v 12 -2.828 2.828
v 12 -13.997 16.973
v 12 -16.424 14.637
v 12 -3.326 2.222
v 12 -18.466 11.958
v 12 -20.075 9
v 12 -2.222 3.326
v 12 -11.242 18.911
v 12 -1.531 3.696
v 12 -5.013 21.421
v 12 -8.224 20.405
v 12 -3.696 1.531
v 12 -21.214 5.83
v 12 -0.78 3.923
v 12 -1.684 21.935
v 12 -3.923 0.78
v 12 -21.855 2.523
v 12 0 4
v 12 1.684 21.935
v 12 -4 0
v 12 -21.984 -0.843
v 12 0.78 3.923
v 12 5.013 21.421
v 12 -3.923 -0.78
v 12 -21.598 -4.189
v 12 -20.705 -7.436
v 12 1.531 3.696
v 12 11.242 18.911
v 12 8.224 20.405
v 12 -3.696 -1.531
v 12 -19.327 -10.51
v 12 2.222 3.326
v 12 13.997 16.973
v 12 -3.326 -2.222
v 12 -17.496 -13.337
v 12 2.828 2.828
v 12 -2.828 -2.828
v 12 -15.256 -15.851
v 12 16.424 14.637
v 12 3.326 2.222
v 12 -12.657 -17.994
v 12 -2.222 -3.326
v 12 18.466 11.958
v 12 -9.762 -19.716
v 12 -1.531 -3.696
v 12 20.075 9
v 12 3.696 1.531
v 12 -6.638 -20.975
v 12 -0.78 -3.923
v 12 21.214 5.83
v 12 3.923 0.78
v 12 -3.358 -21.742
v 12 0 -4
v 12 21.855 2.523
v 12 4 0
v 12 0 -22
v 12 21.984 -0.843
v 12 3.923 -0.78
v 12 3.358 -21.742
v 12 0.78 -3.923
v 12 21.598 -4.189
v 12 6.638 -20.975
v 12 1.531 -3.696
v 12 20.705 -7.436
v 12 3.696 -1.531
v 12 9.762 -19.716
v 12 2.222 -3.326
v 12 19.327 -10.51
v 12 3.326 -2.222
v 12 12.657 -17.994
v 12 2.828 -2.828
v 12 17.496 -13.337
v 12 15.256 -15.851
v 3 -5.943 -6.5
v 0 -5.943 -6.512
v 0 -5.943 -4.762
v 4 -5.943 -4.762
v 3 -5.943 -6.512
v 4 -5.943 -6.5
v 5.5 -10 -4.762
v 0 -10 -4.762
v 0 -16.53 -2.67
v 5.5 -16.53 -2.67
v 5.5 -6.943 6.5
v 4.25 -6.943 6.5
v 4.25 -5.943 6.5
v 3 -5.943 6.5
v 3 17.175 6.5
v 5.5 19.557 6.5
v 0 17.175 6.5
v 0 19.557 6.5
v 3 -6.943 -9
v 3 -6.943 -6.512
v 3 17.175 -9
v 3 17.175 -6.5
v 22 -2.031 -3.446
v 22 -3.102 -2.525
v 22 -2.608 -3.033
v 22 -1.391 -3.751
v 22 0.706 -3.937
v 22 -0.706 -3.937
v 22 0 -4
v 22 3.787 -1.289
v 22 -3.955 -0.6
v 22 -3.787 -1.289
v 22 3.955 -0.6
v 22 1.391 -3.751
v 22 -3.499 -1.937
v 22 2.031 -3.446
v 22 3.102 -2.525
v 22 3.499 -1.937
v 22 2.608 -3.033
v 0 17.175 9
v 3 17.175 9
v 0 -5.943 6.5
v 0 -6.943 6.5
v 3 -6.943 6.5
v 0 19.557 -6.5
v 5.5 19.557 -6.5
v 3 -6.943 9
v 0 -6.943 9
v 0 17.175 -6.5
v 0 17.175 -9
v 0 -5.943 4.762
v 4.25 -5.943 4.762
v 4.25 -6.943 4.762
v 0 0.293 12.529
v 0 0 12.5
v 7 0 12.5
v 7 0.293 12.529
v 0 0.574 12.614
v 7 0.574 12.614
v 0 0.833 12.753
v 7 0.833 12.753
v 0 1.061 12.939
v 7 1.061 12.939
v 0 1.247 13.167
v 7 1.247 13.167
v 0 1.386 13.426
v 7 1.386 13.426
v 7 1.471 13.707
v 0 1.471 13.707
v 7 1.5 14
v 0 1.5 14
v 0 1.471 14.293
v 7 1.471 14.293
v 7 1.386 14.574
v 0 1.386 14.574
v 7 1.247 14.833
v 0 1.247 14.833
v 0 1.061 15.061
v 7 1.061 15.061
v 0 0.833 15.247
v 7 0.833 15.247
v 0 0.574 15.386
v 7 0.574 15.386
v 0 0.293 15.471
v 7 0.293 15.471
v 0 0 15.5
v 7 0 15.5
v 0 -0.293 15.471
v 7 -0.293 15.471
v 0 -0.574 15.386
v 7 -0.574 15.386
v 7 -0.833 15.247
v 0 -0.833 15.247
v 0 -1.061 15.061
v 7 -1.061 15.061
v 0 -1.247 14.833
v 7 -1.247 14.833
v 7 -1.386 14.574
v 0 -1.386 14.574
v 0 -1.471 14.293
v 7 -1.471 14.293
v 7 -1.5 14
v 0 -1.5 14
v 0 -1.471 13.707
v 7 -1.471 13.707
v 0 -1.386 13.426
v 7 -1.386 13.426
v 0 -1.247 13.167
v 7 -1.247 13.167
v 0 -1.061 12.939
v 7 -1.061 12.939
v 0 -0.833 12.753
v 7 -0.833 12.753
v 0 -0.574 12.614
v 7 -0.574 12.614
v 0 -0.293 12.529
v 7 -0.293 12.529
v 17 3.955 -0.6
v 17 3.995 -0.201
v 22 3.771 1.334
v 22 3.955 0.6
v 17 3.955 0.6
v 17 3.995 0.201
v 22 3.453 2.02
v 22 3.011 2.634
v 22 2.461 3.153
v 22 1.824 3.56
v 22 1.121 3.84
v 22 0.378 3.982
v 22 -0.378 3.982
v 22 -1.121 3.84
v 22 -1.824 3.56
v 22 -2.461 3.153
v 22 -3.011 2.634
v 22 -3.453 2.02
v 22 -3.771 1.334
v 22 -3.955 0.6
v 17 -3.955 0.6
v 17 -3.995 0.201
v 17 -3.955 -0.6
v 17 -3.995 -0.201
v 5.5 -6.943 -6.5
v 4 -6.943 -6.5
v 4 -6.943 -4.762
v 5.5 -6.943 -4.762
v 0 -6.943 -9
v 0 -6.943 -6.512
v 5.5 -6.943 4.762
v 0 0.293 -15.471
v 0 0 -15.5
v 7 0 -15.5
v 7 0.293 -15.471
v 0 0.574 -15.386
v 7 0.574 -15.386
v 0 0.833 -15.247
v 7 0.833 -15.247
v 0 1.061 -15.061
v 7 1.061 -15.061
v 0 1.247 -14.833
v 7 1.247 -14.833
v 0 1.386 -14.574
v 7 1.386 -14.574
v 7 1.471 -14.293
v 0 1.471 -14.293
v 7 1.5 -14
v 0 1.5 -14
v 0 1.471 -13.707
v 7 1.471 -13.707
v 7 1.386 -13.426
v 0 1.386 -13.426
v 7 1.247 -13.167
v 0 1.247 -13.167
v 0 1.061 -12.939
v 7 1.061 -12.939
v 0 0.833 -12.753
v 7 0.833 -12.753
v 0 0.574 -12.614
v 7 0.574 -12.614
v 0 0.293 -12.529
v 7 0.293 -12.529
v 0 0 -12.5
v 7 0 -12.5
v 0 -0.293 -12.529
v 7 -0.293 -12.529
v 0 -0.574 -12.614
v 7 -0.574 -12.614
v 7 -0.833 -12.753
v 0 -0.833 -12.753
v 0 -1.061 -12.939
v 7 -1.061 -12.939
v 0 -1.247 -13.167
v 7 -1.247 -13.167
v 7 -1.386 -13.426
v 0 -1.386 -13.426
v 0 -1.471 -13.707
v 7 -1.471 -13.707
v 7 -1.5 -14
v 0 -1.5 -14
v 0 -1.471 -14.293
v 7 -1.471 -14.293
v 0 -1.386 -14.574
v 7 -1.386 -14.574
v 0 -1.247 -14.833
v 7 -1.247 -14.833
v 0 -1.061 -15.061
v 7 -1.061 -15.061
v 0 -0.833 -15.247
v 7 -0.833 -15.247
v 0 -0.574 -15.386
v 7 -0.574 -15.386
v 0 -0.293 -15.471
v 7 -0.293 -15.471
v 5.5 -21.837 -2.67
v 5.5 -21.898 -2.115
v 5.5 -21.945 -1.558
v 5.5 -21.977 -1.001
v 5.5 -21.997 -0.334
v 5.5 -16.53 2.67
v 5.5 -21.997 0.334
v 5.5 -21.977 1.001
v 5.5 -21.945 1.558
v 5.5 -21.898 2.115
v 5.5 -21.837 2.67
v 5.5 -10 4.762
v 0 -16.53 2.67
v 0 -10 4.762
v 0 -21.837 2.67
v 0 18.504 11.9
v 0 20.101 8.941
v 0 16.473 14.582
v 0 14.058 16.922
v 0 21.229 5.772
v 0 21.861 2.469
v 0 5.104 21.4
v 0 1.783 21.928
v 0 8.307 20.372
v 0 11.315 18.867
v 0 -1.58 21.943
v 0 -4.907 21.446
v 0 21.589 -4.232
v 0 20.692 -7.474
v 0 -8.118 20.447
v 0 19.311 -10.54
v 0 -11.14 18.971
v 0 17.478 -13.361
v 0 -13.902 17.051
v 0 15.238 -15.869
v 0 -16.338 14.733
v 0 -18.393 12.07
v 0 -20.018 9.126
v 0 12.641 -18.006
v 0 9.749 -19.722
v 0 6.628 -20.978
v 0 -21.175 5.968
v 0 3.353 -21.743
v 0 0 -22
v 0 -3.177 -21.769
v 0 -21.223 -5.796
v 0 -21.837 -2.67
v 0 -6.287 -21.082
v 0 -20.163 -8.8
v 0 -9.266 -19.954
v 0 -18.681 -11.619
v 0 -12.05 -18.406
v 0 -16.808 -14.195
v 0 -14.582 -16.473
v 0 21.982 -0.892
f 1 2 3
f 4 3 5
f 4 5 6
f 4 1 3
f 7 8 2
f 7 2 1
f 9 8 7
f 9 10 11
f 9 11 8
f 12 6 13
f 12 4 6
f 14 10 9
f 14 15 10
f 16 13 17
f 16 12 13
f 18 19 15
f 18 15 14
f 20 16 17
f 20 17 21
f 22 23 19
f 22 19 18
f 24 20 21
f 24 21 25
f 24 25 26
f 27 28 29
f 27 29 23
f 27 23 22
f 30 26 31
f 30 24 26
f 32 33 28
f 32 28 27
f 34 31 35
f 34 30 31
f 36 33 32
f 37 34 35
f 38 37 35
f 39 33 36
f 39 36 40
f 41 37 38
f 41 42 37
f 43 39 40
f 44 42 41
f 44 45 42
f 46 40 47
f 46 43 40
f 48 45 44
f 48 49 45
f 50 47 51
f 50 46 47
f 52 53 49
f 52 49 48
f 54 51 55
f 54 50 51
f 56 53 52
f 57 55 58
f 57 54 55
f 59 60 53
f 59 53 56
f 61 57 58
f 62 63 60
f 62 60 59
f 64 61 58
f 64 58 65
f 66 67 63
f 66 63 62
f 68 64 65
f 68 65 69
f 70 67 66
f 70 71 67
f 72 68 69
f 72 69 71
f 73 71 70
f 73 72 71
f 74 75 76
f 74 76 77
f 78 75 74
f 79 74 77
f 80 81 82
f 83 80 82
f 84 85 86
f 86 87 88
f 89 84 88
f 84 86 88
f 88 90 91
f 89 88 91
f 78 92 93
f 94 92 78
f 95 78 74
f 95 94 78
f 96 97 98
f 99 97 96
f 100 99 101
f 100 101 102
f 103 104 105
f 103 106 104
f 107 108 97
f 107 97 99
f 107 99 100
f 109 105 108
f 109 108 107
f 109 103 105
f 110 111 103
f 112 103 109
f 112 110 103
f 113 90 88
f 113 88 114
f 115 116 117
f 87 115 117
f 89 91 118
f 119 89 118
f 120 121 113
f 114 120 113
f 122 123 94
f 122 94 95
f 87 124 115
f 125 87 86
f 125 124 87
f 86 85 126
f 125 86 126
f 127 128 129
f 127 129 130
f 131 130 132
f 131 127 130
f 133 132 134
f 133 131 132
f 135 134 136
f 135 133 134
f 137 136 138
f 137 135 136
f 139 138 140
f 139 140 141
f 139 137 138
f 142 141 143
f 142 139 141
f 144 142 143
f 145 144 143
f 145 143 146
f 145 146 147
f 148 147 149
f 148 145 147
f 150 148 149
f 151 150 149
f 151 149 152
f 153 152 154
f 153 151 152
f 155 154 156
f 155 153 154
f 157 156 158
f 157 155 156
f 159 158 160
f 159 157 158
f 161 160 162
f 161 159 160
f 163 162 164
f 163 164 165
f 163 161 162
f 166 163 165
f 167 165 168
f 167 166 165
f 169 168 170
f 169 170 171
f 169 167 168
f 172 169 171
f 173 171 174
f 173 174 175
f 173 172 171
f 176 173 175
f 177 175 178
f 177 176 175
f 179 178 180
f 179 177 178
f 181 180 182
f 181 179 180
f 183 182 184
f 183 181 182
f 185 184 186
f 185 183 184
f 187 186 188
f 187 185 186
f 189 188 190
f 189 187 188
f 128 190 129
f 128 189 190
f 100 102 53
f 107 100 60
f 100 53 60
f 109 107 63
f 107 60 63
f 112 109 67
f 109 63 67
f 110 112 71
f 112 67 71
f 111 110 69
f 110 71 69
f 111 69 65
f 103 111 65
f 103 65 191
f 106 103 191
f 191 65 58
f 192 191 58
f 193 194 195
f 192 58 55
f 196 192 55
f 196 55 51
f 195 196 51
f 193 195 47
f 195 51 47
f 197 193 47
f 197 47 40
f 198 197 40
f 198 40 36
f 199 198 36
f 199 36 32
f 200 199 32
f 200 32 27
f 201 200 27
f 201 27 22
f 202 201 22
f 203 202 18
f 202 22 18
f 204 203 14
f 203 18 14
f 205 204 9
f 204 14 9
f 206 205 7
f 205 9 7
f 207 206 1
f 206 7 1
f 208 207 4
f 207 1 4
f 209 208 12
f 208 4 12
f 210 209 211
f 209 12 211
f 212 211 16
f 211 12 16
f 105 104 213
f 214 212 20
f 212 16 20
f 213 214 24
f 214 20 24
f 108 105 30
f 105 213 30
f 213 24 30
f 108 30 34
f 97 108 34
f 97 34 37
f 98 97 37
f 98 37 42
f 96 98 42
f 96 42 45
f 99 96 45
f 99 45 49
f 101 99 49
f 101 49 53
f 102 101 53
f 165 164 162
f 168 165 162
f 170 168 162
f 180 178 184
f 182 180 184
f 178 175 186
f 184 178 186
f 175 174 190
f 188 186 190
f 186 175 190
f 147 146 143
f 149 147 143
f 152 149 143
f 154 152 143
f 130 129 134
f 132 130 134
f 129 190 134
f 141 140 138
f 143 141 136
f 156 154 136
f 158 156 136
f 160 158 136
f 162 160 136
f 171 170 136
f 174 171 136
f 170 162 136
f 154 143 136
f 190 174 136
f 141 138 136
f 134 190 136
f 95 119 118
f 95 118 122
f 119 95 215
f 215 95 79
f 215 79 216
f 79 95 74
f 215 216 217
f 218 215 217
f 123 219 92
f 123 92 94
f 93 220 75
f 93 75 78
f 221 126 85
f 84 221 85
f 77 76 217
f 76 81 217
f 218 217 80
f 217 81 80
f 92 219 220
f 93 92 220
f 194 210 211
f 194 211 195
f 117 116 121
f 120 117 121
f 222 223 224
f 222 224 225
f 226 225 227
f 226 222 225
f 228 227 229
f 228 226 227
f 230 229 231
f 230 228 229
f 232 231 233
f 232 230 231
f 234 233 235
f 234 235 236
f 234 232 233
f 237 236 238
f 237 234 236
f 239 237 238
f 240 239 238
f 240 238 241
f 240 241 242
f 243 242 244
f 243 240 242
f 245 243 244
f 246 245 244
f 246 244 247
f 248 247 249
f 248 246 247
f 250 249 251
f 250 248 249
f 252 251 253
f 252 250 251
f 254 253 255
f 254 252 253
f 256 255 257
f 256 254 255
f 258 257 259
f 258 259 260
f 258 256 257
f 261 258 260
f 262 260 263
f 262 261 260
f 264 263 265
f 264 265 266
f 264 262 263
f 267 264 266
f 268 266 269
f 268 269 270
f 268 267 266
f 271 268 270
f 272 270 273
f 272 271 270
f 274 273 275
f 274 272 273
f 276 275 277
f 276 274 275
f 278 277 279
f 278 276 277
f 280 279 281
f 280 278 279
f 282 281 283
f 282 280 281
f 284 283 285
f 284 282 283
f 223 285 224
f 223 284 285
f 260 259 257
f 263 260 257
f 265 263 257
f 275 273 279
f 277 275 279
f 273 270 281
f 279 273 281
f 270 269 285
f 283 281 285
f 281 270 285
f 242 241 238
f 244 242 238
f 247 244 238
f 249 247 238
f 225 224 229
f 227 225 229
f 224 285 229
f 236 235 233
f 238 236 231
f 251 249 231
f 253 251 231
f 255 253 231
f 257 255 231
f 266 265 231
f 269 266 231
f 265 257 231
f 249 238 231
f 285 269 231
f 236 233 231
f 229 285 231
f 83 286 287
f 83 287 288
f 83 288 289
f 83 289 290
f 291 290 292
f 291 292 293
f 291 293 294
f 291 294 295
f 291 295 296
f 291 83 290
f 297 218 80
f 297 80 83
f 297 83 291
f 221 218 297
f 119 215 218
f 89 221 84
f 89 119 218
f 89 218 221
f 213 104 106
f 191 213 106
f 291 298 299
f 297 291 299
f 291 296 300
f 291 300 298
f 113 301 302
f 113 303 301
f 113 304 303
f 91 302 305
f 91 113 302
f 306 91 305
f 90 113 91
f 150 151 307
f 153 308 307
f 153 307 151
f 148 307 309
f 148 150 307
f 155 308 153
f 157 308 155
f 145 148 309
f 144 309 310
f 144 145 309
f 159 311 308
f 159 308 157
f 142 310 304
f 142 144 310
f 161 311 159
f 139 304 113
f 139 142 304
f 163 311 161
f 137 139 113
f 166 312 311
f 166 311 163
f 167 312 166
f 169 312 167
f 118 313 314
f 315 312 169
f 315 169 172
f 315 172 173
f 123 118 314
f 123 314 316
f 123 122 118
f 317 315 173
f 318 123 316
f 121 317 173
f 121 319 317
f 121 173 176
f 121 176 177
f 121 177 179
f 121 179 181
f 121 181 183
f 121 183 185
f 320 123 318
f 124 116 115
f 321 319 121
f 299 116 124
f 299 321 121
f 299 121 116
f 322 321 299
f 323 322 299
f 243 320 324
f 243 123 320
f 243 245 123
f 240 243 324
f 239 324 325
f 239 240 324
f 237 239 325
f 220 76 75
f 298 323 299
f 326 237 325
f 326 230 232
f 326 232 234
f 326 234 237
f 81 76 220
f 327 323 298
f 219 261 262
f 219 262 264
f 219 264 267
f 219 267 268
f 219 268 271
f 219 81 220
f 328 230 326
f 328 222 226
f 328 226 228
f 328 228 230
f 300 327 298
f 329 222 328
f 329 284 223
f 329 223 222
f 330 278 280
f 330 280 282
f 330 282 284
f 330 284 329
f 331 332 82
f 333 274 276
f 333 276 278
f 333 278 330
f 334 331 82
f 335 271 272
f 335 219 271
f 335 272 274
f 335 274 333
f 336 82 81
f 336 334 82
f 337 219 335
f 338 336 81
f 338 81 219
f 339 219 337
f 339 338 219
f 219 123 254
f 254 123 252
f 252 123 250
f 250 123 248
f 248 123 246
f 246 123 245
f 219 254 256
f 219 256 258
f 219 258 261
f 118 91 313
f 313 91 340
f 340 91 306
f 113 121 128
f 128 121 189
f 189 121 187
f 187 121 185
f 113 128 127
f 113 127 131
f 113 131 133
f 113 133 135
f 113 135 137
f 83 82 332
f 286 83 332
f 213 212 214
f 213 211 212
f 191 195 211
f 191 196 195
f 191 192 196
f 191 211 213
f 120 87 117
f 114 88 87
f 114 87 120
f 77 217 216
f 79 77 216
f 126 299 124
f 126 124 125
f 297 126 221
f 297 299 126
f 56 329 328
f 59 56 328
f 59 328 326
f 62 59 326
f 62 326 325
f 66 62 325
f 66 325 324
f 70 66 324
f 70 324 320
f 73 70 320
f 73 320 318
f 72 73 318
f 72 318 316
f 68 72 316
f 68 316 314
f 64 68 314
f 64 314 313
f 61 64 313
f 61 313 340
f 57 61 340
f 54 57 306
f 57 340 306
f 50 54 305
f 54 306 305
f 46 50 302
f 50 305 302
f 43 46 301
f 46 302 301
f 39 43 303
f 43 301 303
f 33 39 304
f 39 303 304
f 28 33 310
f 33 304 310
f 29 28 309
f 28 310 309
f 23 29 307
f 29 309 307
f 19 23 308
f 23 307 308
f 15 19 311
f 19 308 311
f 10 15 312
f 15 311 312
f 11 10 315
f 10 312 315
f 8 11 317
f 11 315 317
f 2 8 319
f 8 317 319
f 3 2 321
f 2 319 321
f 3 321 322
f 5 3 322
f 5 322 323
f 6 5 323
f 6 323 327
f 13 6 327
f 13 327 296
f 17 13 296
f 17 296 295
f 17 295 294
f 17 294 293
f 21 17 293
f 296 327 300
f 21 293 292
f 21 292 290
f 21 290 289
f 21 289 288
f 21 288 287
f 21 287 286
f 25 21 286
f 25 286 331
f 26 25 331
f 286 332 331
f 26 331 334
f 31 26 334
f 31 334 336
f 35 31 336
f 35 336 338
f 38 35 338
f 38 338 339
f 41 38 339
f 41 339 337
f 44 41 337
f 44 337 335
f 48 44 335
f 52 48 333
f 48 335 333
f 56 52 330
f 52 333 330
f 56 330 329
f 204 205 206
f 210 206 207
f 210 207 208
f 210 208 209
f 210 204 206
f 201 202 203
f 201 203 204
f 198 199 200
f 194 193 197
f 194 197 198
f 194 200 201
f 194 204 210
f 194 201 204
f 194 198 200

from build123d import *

# Parameters (mm, degrees)
SKETCH1_R           = 22
BOSS_EXTRUDE1_DEPTH = 12
CUT_EXTRUDE2_DEPTH  = 5.5
SKETCH15_W          = 18
SKETCH15_H          = 24.118038922
CUT_EXTRUDE3_DEPTH  = 3
SKETCH16_R          = 4
BOSS_EXTRUDE2_DEPTH = 10
CUT_EXTRUDE4_START  = 22
SKETCH8_W           = 1.2
SKETCH8_H           = 10
CUT_EXTRUDE4_DEPTH  = 5
SKETCH17_W          = 4
SKETCH17_H          = 1.75
BOSS_EXTRUDE3_DEPTH = 1
SKETCH18_W          = 4.25
SKETCH18_H          = 1.737607108
BOSS_EXTRUDE4_DEPTH = 1
SKETCH22_R          = 1.5
CUT_EXTRUDE7_DEPTH  = 7


with BuildPart() as part:
    # Sketch1 → Boss-Extrude1 (new body)
    with BuildSketch(Plane(origin=(0, 0, 0), x_dir=(0, 0, -1), z_dir=(1, 0, 0))):
        Circle(SKETCH1_R)
    extrude(amount=BOSS_EXTRUDE1_DEPTH)

    # Sketch13 → Cut-Extrude2 (cut)
    with BuildSketch(Plane(origin=(0, 0, 0), x_dir=(0, 0, -1), z_dir=(1, 0, 0))):
        with BuildLine():
            Line((-2.670420152, -16.85816067), (-2.670420152, -16.530371213))
            Line((-2.670420152, -16.530371213), (-4.762392892, -10))
            Line((-4.762392892, -10), (-4.762392892, -6.943148259))
            Line((-4.762392892, -6.943148259), (-6.5, -6.943148259))
            Line((-6.5, -6.943148259), (-6.5, 19.556851741))
            Line((-6.5, 19.556851741), (6.5, 19.556851741))
            Line((6.5, 19.556851741), (6.5, -6.943148259))
            Line((6.5, -6.943148259), (4.762392892, -6.943148259))
            Line((4.762392892, -6.943148259), (4.762392892, -10))
            Line((4.762392892, -10), (2.670420152, -16.530371213))
            Line((2.670420152, -16.530371213), (2.670420152, -16.85816067))
            Line((2.670420152, -16.85816067), (2.670420152, -21.837327131))
            ThreePointArc((2.670420152, -21.837327131), (1.836835043, -21.92318492), (1.000584871, -21.977234355))
            Line((1.000584871, -21.977234355), (0, -25.25))
            Line((0, -25.25), (-1.000584871, -21.977234355))
            ThreePointArc((-1.000584871, -21.977234355), (-1.836835043, -21.92318492), (-2.670420152, -21.837327131))
            Line((-2.670420152, -21.837327131), (-2.670420152, -16.85816067))
        make_face()
    extrude(amount=CUT_EXTRUDE2_DEPTH, mode=Mode.SUBTRACT)

    # Sketch15 → Cut-Extrude3 (cut)
    with BuildSketch(Plane.ZY):
        with Locations((0, 5.115871202)):
            Rectangle(SKETCH15_W, SKETCH15_H)
    extrude(amount=-CUT_EXTRUDE3_DEPTH, mode=Mode.SUBTRACT)

    # Sketch16 → Boss-Extrude2 (add)
    with BuildSketch(Plane(origin=(12, 0, 0), x_dir=(0, 0, -1), z_dir=(1, 0, 0))):
        Circle(SKETCH16_R)
    extrude(amount=BOSS_EXTRUDE2_DEPTH)

    # Sketch8 → Cut-Extrude4 (cut)
    with BuildSketch(Plane(origin=(0, 0, 0), x_dir=(0, 0, -1), z_dir=(1, 0, 0)).offset(CUT_EXTRUDE4_START)):
        Rectangle(SKETCH8_W, SKETCH8_H)
    extrude(amount=-CUT_EXTRUDE4_DEPTH, mode=Mode.SUBTRACT)

    # Sketch17 → Boss-Extrude3 (add)
    with BuildSketch(Plane(origin=(0, -6.943148259, 0), x_dir=(1, 0, 0), z_dir=(0, 1, 0))):
        with Locations((2, 5.637392892)):
            Rectangle(SKETCH17_W, SKETCH17_H)
    extrude(amount=BOSS_EXTRUDE3_DEPTH)

    # Sketch18 → Boss-Extrude4 (add)
    with BuildSketch(Plane(origin=(0, -6.943148259, 0), x_dir=(1, 0, 0), z_dir=(0, 1, 0))):
        with Locations((2.125, -5.631196446)):
            Rectangle(SKETCH18_W, SKETCH18_H)
    extrude(amount=BOSS_EXTRUDE4_DEPTH)

    # Sketch22 → Cut-Extrude7 (cut)
    with BuildSketch(Plane(origin=(0, 0, 0), x_dir=(0, 0, -1), z_dir=(1, 0, 0))):
        with Locations((-14, 0)):
            Circle(SKETCH22_R)
        with Locations((14, 0)):
            Circle(SKETCH22_R)
    extrude(amount=CUT_EXTRUDE7_DEPTH, mode=Mode.SUBTRACT)


solid = part.part
